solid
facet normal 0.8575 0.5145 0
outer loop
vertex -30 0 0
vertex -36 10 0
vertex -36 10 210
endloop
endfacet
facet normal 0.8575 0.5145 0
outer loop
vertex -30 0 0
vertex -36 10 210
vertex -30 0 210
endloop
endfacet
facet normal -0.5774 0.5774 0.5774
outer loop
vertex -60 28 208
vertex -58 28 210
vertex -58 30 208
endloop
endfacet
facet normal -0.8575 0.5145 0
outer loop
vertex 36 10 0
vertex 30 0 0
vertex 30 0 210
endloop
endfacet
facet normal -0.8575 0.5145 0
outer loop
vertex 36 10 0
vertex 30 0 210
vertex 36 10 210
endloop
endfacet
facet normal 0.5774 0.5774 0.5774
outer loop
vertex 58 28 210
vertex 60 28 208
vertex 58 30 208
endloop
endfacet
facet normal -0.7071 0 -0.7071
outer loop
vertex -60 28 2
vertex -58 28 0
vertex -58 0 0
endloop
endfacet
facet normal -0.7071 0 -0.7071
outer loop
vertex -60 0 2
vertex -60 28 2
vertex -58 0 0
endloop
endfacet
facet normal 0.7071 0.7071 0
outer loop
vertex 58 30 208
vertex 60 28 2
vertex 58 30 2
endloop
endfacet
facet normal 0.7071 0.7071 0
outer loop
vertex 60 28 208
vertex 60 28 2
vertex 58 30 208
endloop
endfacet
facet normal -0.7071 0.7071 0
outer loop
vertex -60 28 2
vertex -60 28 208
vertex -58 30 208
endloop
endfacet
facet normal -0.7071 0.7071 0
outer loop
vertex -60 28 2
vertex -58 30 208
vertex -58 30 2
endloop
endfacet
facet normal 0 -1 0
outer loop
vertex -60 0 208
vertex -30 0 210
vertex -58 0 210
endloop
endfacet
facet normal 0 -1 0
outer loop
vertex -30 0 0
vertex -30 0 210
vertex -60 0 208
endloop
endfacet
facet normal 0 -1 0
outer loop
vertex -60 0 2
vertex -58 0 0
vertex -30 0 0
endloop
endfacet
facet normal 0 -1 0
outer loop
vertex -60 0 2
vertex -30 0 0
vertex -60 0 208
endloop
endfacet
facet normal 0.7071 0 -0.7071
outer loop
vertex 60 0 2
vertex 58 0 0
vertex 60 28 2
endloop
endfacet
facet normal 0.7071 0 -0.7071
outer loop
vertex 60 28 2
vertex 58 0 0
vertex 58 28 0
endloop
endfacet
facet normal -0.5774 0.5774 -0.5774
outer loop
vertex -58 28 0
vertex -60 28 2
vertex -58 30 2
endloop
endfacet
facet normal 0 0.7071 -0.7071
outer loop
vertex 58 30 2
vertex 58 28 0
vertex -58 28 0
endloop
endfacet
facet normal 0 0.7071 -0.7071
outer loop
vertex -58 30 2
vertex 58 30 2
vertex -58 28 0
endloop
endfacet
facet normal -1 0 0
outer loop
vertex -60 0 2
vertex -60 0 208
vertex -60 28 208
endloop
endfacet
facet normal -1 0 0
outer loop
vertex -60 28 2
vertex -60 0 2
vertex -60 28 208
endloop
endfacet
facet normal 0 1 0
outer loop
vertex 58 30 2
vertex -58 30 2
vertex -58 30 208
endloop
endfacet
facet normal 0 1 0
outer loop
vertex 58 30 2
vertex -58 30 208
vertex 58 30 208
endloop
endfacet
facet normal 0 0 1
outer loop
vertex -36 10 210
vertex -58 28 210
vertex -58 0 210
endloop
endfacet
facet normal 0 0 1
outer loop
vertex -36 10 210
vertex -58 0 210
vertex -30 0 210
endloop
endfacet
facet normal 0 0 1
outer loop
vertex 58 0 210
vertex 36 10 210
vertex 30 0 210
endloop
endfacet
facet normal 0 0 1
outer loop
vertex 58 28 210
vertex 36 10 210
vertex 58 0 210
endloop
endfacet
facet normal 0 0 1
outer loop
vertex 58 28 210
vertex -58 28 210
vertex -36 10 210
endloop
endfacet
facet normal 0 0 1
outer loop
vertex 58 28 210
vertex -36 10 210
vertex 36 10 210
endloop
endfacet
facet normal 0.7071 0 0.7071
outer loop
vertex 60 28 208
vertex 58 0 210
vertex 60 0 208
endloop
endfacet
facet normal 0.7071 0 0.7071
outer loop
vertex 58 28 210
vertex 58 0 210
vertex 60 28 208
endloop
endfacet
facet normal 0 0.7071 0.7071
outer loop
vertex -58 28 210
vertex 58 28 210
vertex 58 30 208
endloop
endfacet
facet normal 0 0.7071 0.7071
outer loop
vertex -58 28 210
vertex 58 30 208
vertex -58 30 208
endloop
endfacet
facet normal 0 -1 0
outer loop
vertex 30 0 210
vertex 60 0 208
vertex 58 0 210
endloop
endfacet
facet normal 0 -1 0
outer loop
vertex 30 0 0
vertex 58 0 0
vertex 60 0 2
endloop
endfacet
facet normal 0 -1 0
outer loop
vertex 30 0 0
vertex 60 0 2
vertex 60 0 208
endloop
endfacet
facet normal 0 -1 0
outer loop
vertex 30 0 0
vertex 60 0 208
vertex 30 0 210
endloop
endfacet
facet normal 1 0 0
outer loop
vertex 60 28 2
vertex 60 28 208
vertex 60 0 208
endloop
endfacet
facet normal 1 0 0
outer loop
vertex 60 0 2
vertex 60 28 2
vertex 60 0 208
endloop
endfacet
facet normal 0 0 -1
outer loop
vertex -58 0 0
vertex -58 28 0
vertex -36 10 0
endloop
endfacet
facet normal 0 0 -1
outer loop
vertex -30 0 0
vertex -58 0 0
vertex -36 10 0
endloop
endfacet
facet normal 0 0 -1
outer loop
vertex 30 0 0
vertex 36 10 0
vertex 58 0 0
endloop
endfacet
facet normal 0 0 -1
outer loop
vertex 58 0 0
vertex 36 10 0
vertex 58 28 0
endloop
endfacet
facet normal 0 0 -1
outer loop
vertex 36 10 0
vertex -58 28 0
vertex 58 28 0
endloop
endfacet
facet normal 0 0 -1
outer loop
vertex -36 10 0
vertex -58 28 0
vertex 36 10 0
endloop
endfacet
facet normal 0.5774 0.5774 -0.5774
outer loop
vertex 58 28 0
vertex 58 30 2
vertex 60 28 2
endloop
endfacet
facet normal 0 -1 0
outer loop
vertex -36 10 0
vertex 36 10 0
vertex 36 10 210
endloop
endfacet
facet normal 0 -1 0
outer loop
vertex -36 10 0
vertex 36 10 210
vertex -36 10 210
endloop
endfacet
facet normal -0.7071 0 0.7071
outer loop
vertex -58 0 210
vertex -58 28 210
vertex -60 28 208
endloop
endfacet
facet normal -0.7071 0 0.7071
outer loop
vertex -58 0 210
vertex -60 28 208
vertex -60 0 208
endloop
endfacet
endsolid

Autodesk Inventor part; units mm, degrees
ref_plane "YZ Plane" through (0, 0, 0) normal (1, 0, 0) x (0, 1, 0)
ref_plane "XZ Plane" through (0, 0, 0) normal (0, 1, 0) x (-1, 0, 0)
ref_plane "XY Plane" through (0, 0, 0) normal (0, 0, 1) x (1, 0, 0)
sketch "Sketch1" plane through (0, 0, 0) normal (0, 0, 1) x (1, 0, 0)
  line L0 (-60, 30) -> (60, 30)
  line L1 (60, 30) -> (60, 0)
  line L2 (60, 0) -> (30, 0)
  line L3 (30, 0) -> (36, 10)
  line L4 (36, 10) -> (-36, 10)
  line L5 (-36, 10) -> (-30, 0)
  line L6 (-30, 0) -> (-60, 0)
  line L7 (-60, 0) -> (-60, 30)
  line L8 (0, 0) -> (0, 10) construction
  line L9 (0, 10) -> (0, 30) construction
  dimension "d0" = 30
  dimension "d1" = 20
  dimension "d2" = 72
  dimension "d3" = 6
  dimension "d4" = 6
  dimension "d5" = 120
  dimension "d6" = 30
extrude "Extrusion1" add sketch "Sketch1" along normal blind 210
chamfer "Chamfer1" distance 2 angle 45 8 edges at (60, 15, 210) (60, 30, 105) (0, 30, 210) (-60, 15, 210) (-60, 30, 105) (-60, 15, 0) (0, 30, 0) (60, 15, 0)
properties part number "Cross Slide"
